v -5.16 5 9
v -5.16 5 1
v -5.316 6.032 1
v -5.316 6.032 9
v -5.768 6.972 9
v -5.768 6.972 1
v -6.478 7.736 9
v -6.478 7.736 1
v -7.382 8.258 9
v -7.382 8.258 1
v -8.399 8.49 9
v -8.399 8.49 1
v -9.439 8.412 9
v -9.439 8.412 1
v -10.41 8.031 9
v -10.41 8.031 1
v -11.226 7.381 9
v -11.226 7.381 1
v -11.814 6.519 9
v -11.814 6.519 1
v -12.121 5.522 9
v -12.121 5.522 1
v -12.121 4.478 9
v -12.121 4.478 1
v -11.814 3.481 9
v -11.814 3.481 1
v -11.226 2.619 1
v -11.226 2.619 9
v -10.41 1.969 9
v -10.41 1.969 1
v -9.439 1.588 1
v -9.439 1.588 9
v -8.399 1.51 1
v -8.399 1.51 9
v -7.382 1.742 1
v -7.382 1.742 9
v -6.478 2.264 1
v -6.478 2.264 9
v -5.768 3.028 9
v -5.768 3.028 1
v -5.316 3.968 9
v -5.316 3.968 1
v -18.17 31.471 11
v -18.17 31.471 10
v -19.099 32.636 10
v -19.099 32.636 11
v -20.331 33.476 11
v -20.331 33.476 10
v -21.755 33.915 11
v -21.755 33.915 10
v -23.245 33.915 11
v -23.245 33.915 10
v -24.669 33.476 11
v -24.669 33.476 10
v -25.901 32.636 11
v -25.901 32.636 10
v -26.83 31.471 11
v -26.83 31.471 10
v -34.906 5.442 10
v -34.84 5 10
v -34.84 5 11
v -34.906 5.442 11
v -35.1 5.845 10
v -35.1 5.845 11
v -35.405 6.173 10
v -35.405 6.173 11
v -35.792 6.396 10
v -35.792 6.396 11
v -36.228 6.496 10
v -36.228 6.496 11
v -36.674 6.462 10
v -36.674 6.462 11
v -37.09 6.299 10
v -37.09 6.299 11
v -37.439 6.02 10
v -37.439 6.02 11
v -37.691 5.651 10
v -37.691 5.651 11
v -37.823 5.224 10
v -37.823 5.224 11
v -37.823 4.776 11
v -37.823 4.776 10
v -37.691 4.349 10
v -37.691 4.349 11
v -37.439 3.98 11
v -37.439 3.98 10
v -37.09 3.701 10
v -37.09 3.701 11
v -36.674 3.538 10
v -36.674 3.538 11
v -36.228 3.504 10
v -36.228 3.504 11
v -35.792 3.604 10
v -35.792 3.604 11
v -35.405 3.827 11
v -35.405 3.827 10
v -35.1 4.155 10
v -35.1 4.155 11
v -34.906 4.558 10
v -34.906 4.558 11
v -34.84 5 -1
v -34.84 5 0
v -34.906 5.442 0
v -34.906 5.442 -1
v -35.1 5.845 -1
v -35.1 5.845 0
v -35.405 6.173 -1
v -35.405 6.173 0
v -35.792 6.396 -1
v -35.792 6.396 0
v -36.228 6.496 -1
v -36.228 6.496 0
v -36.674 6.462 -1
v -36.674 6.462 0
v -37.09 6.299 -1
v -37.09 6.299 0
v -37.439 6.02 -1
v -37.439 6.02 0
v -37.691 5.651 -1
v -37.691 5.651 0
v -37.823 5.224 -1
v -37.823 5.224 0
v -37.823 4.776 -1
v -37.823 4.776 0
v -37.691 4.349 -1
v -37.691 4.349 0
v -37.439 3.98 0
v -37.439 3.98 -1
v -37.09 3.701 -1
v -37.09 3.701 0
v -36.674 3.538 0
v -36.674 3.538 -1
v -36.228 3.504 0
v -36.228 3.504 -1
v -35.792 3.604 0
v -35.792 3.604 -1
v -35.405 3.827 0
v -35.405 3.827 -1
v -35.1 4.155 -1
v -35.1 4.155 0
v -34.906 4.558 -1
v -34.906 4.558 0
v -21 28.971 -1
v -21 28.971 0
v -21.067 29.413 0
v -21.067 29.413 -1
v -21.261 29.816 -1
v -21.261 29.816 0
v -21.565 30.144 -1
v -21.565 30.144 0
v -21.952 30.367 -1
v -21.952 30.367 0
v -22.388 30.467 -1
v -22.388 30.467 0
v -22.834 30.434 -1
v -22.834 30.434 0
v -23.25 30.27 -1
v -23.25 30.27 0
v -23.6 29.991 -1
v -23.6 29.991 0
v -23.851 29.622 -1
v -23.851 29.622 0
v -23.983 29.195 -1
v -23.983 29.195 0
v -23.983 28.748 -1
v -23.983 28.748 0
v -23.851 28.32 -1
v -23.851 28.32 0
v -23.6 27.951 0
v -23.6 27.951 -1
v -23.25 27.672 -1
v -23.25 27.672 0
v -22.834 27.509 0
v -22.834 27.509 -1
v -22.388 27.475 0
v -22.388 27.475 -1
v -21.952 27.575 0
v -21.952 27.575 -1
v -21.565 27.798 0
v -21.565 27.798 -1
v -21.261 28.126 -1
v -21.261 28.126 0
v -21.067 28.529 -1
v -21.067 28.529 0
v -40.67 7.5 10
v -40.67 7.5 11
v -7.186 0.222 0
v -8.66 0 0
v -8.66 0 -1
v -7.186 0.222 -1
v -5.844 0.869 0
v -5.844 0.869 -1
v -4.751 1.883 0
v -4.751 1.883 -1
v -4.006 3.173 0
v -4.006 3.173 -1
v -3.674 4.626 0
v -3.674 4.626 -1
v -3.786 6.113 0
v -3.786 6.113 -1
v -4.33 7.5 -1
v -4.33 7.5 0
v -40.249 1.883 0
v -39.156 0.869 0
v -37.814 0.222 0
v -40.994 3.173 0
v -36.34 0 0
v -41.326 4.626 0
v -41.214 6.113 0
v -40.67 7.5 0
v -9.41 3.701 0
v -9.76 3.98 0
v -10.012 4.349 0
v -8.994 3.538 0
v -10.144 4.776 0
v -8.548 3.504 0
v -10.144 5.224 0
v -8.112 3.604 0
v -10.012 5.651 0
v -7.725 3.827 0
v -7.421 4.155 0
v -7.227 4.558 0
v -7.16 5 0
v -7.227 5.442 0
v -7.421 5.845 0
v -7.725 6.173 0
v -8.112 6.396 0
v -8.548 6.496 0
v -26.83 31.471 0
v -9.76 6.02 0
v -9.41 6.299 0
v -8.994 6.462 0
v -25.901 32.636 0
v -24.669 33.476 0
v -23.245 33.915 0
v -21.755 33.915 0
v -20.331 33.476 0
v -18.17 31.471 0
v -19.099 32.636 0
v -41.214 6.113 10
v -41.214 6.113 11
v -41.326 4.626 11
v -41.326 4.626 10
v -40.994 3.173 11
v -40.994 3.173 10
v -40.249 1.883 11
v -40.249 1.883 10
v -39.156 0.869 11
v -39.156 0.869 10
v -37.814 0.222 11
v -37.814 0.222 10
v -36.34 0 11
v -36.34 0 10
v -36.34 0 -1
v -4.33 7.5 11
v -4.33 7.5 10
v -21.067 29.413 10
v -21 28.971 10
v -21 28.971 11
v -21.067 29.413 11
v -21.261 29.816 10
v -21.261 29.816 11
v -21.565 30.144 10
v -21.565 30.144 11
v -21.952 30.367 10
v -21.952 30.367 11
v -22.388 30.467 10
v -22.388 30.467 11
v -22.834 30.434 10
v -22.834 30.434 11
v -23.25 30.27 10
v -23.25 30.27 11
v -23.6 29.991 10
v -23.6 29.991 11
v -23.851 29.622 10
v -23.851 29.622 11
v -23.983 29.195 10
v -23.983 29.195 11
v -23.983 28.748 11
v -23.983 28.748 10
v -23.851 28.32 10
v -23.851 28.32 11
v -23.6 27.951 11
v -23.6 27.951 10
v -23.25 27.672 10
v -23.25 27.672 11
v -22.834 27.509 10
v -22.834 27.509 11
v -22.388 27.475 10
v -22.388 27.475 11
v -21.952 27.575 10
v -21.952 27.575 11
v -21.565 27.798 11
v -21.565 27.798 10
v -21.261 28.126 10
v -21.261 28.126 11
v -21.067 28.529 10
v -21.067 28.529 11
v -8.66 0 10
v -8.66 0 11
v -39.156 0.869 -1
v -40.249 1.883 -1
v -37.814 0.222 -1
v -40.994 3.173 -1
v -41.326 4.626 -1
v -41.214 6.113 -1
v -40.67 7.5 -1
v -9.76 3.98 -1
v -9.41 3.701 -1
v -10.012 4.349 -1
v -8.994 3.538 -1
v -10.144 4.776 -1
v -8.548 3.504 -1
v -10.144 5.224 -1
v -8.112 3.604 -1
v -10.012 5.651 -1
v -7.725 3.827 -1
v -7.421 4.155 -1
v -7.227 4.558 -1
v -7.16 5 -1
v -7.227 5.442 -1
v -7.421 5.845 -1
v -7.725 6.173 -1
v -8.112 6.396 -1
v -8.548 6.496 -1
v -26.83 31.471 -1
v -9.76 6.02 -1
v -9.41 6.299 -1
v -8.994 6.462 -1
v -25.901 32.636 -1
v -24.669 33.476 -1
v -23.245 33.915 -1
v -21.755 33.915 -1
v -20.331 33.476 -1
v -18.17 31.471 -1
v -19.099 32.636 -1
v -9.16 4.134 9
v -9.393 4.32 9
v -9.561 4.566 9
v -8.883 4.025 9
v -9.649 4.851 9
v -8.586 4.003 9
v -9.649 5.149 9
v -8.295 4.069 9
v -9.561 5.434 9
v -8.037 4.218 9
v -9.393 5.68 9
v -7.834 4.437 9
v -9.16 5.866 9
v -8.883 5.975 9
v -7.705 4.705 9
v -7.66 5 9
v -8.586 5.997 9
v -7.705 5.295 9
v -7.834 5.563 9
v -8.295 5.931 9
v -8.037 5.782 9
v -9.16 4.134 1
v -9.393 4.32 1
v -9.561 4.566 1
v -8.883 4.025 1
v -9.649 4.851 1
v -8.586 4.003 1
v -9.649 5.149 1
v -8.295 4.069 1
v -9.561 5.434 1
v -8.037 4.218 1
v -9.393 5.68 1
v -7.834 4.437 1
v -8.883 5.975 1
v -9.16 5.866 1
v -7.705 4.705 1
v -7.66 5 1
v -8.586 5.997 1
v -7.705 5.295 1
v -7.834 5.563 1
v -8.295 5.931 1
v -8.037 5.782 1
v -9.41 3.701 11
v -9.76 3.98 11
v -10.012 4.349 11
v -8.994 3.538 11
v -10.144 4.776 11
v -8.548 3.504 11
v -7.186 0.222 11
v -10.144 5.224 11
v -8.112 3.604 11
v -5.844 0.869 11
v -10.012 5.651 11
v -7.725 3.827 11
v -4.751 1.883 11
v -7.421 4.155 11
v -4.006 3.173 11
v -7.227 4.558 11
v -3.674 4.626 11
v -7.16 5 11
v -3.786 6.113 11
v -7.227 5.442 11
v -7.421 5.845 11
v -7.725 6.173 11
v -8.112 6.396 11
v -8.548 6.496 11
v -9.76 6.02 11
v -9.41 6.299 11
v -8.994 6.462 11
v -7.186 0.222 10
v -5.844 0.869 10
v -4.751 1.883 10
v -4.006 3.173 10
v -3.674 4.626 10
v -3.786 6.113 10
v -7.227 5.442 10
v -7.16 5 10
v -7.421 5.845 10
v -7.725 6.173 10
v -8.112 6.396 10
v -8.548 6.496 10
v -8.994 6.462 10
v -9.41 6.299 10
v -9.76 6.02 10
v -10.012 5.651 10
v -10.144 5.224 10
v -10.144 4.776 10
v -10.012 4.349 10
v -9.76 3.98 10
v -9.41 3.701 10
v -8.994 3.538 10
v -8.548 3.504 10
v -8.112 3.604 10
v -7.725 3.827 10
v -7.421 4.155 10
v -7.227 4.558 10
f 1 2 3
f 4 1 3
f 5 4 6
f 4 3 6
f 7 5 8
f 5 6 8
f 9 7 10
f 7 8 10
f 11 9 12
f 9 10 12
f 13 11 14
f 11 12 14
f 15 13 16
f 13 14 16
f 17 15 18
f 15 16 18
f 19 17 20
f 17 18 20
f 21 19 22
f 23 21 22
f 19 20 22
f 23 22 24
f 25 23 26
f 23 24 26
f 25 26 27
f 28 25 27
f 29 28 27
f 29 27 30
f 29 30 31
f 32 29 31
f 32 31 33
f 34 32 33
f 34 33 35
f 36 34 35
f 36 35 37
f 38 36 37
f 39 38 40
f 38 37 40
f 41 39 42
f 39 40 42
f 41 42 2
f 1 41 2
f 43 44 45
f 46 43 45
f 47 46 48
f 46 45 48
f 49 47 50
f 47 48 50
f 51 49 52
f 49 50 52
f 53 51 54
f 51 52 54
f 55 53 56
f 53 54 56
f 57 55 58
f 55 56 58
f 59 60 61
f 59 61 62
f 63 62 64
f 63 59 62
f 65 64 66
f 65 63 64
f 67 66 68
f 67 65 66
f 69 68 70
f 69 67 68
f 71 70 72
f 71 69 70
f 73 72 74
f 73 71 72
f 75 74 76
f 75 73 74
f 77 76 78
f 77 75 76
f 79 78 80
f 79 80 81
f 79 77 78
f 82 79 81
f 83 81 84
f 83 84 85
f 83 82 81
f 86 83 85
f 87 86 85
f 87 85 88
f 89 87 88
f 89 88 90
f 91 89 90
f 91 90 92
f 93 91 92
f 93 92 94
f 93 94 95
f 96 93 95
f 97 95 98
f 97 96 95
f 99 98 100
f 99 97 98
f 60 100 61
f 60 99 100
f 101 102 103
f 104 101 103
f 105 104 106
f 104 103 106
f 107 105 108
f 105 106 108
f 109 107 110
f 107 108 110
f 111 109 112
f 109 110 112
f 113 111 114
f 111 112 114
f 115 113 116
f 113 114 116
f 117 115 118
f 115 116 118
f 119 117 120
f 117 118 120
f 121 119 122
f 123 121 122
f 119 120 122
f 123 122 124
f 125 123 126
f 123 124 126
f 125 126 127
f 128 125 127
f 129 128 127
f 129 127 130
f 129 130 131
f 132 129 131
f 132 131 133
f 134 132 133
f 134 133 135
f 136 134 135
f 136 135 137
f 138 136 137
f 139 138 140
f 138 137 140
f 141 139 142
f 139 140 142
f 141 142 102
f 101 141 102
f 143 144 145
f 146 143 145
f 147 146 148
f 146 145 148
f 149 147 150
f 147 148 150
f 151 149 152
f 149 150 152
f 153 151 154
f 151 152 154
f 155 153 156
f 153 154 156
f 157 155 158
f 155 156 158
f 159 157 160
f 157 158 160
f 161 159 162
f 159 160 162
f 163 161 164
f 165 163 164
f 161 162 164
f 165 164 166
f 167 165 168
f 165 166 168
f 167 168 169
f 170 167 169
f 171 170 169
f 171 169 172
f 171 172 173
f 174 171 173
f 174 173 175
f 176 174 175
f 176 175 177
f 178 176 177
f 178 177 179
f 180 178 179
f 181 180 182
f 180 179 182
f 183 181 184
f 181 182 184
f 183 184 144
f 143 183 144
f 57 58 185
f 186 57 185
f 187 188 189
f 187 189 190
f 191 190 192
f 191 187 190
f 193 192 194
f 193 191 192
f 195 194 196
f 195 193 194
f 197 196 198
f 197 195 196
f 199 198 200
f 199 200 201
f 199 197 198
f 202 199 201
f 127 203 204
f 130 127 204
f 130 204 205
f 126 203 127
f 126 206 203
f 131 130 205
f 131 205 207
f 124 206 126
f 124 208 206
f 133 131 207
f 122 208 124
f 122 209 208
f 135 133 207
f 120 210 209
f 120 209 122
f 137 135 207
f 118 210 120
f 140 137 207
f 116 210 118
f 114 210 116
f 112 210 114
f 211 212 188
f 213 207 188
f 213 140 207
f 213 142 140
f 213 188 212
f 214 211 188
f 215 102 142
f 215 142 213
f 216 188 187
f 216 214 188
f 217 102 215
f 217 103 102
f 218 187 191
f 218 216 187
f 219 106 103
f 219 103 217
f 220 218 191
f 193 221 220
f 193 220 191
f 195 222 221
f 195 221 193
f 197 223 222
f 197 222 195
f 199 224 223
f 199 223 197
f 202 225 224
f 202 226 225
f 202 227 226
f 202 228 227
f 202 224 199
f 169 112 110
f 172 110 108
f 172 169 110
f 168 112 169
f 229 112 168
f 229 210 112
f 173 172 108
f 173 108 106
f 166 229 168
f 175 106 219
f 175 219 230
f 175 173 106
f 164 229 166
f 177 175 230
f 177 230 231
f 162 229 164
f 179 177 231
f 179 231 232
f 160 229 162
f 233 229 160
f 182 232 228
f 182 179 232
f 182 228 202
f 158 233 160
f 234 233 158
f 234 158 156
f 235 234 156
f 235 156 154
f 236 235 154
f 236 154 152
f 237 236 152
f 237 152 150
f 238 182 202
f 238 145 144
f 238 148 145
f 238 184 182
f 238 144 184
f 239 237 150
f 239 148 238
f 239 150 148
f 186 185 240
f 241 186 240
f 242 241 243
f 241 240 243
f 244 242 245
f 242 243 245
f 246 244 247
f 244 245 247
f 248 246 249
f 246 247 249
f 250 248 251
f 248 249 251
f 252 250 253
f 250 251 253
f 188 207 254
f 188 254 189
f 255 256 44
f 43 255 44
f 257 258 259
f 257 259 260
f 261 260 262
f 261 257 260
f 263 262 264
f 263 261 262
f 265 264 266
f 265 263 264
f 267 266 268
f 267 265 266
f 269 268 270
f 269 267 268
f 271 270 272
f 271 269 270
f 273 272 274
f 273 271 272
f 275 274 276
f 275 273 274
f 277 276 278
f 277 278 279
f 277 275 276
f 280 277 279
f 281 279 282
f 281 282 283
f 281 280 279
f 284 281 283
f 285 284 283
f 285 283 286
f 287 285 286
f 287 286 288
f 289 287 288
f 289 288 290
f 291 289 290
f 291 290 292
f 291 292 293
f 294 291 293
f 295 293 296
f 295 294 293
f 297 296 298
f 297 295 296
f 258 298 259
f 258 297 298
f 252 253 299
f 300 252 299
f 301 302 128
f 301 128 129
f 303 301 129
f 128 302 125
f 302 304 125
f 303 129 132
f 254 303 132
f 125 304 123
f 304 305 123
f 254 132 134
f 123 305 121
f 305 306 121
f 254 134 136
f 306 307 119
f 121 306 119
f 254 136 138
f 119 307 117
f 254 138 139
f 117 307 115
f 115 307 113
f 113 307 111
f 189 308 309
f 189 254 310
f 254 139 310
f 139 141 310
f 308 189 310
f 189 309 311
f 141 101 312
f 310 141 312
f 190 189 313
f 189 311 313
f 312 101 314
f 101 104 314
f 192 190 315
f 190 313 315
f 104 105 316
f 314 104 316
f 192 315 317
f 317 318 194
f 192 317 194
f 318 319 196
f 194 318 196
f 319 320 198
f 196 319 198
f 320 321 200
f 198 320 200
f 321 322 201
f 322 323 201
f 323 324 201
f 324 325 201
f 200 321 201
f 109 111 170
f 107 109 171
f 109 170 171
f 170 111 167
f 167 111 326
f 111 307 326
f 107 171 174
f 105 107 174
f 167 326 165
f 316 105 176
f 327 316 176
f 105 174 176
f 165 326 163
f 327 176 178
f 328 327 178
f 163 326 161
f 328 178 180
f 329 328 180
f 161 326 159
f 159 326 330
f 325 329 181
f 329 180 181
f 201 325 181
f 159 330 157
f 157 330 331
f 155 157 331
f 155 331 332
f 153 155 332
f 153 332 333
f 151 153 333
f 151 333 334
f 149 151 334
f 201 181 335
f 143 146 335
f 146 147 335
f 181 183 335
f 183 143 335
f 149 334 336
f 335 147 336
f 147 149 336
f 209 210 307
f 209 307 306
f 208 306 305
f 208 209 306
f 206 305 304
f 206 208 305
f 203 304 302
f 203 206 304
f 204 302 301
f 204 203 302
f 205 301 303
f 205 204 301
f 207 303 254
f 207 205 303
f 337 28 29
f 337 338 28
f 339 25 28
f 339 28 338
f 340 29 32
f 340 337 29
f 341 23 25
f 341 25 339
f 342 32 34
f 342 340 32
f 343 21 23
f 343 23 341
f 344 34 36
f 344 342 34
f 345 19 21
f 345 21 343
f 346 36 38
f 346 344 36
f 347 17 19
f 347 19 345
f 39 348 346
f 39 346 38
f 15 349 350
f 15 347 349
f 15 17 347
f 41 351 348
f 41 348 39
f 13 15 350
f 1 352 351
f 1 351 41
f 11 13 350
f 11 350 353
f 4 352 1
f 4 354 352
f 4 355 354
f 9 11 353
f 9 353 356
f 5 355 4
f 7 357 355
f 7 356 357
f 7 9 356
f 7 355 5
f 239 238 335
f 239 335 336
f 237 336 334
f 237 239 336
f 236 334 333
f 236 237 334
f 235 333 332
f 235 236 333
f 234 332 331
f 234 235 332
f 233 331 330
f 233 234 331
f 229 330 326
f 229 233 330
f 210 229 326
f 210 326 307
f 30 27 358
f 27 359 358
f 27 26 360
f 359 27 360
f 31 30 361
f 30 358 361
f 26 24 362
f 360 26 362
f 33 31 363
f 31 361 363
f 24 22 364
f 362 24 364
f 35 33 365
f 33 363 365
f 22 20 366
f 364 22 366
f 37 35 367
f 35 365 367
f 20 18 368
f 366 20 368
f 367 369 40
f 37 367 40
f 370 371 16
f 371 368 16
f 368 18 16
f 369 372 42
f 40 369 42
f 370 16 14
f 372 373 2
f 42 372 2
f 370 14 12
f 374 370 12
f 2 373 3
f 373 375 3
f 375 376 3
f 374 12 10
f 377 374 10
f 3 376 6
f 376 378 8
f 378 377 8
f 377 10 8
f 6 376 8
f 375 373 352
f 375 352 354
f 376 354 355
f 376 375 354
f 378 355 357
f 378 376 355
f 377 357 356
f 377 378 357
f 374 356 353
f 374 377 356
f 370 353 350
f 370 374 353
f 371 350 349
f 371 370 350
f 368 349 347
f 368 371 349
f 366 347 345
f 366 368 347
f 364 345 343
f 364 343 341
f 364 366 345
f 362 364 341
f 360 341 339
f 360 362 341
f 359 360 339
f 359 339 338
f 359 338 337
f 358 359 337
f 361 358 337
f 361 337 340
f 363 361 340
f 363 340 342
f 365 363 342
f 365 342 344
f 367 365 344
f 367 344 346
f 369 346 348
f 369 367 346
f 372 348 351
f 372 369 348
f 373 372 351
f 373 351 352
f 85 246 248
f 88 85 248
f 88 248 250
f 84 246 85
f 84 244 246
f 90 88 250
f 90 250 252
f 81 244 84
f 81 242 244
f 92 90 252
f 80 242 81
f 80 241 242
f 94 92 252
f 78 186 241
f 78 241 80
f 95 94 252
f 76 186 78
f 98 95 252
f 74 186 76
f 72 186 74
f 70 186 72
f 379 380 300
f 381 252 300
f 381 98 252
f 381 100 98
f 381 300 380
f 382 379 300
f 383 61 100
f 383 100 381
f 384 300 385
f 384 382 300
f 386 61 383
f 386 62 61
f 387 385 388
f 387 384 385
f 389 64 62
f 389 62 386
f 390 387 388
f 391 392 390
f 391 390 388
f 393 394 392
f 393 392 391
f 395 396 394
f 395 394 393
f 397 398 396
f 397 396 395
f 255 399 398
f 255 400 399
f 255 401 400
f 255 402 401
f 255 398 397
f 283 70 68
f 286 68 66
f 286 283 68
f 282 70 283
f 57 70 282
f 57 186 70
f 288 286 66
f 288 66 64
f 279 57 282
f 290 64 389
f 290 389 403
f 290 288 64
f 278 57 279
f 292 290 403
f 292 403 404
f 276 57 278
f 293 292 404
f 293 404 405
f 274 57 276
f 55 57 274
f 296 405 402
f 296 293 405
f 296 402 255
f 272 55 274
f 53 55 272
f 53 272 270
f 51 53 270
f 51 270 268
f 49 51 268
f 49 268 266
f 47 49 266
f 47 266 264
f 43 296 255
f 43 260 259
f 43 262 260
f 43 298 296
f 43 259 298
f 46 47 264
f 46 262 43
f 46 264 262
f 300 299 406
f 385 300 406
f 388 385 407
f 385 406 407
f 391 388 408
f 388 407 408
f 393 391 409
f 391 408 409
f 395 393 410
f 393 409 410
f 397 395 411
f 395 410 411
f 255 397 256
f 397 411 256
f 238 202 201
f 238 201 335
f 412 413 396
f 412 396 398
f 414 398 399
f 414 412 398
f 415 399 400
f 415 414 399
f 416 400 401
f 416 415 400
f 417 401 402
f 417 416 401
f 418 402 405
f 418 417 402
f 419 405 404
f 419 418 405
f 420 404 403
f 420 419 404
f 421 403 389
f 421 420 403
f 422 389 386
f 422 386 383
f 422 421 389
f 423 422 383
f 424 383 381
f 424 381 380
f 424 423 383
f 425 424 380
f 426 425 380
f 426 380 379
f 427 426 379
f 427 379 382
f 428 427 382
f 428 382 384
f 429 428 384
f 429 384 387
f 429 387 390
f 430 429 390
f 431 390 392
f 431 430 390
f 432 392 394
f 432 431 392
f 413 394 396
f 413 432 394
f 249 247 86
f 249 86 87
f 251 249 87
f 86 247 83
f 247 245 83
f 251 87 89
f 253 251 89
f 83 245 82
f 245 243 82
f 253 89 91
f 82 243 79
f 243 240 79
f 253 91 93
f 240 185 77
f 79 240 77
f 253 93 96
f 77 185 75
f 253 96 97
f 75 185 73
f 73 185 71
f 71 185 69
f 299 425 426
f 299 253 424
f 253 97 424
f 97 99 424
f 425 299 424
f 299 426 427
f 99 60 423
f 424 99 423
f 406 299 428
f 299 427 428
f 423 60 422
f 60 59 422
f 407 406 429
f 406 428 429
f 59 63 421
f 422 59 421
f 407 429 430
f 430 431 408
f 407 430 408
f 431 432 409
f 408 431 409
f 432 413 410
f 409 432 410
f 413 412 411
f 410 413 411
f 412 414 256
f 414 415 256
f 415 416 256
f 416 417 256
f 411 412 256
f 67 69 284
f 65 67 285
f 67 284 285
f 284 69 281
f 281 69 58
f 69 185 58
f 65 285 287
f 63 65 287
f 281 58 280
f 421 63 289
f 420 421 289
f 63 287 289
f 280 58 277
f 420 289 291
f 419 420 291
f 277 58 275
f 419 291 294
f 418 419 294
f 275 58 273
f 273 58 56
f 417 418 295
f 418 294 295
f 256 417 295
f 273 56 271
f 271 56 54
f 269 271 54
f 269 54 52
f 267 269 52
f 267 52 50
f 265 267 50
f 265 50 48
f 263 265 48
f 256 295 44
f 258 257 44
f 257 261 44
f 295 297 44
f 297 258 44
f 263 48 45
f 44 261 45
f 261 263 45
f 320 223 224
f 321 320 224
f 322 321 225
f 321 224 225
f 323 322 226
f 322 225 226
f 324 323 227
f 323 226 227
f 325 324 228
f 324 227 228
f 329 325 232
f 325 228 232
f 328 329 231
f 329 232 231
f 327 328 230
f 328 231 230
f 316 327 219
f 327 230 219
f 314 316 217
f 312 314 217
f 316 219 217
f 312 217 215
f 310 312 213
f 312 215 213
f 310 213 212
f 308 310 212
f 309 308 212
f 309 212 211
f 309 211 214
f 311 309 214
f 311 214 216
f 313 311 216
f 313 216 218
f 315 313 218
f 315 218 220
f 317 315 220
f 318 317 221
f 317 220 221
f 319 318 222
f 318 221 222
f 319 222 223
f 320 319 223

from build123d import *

# Parameters (mm, degrees)
F0_R     = 1.5
F1_DEPTH = 1
F2_START = 10
F2_DEPTH = 1
F4_START = 1
F3_R     = 3.5
F3_R_2   = 1.5
F3_R_3   = 1
F4_DEPTH = 8


with BuildPart() as f1:
    # F0 (on Top) → F1 (new body)
    with BuildSketch(Plane.XY):
        with BuildLine():
            ThreePointArc((-8.6602540378, 0), (-4.3301270189, 2.5), (-4.3301270189, 7.5))
            Line((-4.3301270189, 7.5), (-18.1698729811, 31.4711431703))
            ThreePointArc((-18.1698729811, 31.4711431703), (-22.5, 33.9711431703), (-26.8301270189, 31.4711431703))
            Line((-26.8301270189, 31.4711431703), (-40.6698729811, 7.5))
            ThreePointArc((-40.6698729811, 7.5), (-40.6698729811, 2.5), (-36.3397459622, 0))
            Line((-36.3397459622, 0), (-8.6602540378, 0))
        make_face()
        with Locations((-36.3397459622, 5)):
            Circle(F0_R, mode=Mode.SUBTRACT)
        with Locations((-8.6602540378, 5)):
            Circle(F0_R, mode=Mode.SUBTRACT)
        with Locations((-22.5, 28.9711431703)):
            Circle(F0_R, mode=Mode.SUBTRACT)
    extrude(amount=-F1_DEPTH)


with BuildPart() as f2:
    # F0 (on Top) → F2 (new body)
    with BuildSketch(Plane.XY.offset(F2_START)):
        with BuildLine():
            ThreePointArc((-8.6602540378, 0), (-4.3301270189, 2.5), (-4.3301270189, 7.5))
            Line((-4.3301270189, 7.5), (-18.1698729811, 31.4711431703))
            ThreePointArc((-18.1698729811, 31.4711431703), (-22.5, 33.9711431703), (-26.8301270189, 31.4711431703))
            Line((-26.8301270189, 31.4711431703), (-40.6698729811, 7.5))
            ThreePointArc((-40.6698729811, 7.5), (-40.6698729811, 2.5), (-36.3397459622, 0))
            Line((-36.3397459622, 0), (-8.6602540378, 0))
        make_face()
        with Locations((-36.3397459622, 5)):
            Circle(F0_R, mode=Mode.SUBTRACT)
        with Locations((-8.6602540378, 5)):
            Circle(F0_R, mode=Mode.SUBTRACT)
        with Locations((-22.5, 28.9711431703)):
            Circle(F0_R, mode=Mode.SUBTRACT)
    extrude(amount=F2_DEPTH)


with BuildPart() as f4:
    # F3 (on face) → F4 (new body)
    with BuildSketch(Plane.XY.offset(F4_START)):
        with Locations((-8.6602545295, 5.0000002838)):
            Circle(F3_R)
        with Locations((-8.6602540378, 5)):
            Circle(F3_R_2, mode=Mode.SUBTRACT)
        with Locations((-8.6602540378, 5)):
            Circle(F3_R_2)
        with Locations((-8.6602545295, 5.0000002838)):
            Circle(F3_R_3, mode=Mode.SUBTRACT)
    extrude(amount=F4_DEPTH)


solid = Compound([f1.part, f2.part, f4.part])
